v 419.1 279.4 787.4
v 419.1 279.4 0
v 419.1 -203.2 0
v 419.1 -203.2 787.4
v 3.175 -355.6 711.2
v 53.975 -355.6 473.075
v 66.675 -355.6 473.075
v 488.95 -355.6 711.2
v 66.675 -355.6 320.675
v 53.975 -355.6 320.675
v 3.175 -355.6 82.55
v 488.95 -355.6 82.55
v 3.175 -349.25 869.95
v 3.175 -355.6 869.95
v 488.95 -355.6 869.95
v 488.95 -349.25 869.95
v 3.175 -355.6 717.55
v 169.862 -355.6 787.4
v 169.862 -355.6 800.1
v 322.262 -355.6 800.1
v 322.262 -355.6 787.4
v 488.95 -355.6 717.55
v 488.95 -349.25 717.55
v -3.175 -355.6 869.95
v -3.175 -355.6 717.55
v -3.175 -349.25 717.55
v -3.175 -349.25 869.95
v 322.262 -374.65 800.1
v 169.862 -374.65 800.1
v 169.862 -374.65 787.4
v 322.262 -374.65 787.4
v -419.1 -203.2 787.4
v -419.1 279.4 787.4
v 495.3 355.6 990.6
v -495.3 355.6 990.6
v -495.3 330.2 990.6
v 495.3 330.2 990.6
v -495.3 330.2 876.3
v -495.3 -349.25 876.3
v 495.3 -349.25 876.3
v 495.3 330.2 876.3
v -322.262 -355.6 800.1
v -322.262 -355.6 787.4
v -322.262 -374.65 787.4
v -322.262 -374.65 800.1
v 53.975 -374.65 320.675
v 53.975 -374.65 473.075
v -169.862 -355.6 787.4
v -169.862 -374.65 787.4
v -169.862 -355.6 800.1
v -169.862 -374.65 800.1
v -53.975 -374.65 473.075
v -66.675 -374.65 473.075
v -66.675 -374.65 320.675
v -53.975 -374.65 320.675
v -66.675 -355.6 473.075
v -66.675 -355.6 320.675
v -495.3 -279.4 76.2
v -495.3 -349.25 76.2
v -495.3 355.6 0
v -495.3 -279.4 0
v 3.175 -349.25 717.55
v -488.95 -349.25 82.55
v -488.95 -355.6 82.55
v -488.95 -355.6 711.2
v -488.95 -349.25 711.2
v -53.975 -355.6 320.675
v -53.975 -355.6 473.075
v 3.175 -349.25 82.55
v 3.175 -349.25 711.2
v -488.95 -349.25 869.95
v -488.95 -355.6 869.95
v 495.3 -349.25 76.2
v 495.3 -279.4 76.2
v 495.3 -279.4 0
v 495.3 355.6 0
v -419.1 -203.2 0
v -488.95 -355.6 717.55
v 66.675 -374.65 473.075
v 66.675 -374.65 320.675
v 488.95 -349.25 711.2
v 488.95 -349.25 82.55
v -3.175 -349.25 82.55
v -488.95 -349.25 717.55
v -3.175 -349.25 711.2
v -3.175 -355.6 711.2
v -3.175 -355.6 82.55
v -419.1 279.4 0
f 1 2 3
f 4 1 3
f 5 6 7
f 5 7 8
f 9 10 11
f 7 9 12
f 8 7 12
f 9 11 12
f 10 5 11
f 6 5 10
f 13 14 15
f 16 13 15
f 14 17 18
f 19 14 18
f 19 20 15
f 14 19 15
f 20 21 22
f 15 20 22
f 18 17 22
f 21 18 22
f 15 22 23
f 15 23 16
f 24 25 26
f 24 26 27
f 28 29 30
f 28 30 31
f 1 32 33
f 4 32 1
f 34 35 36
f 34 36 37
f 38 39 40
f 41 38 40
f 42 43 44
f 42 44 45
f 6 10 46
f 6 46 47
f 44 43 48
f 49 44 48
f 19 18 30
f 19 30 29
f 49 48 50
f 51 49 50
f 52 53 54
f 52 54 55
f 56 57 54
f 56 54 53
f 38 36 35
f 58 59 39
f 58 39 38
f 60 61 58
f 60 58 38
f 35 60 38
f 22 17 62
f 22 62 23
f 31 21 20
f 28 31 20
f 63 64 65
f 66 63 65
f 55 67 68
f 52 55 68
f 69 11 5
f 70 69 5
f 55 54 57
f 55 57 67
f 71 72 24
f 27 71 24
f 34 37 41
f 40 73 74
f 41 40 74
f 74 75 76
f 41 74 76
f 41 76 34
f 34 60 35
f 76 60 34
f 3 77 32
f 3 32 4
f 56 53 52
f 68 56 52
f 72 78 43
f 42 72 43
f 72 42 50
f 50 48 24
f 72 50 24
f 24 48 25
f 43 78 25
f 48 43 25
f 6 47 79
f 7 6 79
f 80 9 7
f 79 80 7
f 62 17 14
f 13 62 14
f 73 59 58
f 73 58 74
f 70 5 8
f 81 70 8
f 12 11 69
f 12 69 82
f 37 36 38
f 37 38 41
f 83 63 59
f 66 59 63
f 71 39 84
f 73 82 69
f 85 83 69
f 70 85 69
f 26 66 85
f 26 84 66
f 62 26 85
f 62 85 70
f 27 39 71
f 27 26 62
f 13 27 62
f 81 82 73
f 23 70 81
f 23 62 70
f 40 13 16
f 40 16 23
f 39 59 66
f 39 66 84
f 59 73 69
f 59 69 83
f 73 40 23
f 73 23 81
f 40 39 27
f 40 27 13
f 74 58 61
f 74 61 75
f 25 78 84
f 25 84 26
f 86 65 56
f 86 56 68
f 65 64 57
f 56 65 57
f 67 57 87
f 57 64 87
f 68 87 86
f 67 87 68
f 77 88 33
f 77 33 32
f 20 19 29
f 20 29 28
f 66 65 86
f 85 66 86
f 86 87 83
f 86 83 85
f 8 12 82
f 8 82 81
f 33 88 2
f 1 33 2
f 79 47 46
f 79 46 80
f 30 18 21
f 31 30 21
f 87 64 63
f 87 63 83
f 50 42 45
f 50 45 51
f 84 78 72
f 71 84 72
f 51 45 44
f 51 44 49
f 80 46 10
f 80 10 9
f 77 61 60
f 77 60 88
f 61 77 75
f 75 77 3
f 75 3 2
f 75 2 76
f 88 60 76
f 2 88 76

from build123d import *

# Parameters (mm, degrees)
F0_W     = 990.6
F0_H     = 711.2
F1_DEPTH = 990.6
F2_W     = 990.6
F2_H     = 114.3
F3_DEPTH = 685.8
F2_H_2   = 800.1
F2_W_2   = 485.775
F2_H_3   = 628.65
F2_H_4   = 152.4
F4_DEPTH = 6.35
F2_H_5   = 76.2
F5_DEPTH = 76.2
F2_W_3   = 152.4
F2_H_6   = 12.7
F2_W_4   = 12.7
F6_DEPTH = 19.05
F7_W     = 838.2
F7_H     = 482.6
F8_DEPTH = 787.4


with BuildPart() as f1:
    # F0 (on Top) → F1 (new body)
    with BuildSketch(Plane.XY):
        Rectangle(F0_W, F0_H)
    extrude(amount=F1_DEPTH)

    # F2 (on face) → F3 (cut)
    with BuildSketch(Plane.XZ.offset(355.6)):
        with Locations((0, 933.45)):
            Rectangle(F2_W, F2_H)
    extrude(amount=-F3_DEPTH, mode=Mode.SUBTRACT)

    # F2 (on face) → F4 (cut)
    with BuildSketch(Plane.XZ.offset(355.6)):
        with Locations((0, 476.25)):
            Rectangle(F2_W, F2_H_2)
        with Locations((-246.0625, 396.875)):
            Rectangle(F2_W_2, F2_H_3, mode=Mode.SUBTRACT)
        with Locations((246.0625, 396.875)):
            Rectangle(F2_W_2, F2_H_3, mode=Mode.SUBTRACT)
        with Locations((-246.0625, 793.75)):
            Rectangle(F2_W_2, F2_H_4, mode=Mode.SUBTRACT)
        with Locations((246.0625, 793.75)):
            Rectangle(F2_W_2, F2_H_4, mode=Mode.SUBTRACT)
    extrude(amount=-F4_DEPTH, mode=Mode.SUBTRACT)

    # F2 (on face) → F5 (cut)
    with BuildSketch(Plane.XZ.offset(355.6)):
        with Locations((0, 38.1)):
            Rectangle(F2_W, F2_H_5)
    extrude(amount=-F5_DEPTH, mode=Mode.SUBTRACT)

    # F2 (on face) → F6 (join)
    with BuildSketch(Plane.XZ.offset(355.6)):
        with Locations((-246.0625, 793.75)):
            Rectangle(F2_W_3, F2_H_6)
        with Locations((246.0625, 793.75)):
            Rectangle(F2_W_3, F2_H_6)
        with Locations((60.325, 396.875)):
            Rectangle(F2_W_4, F2_H_4)
        with Locations((-60.325, 396.875)):
            Rectangle(F2_W_4, F2_H_4)
    extrude(amount=F6_DEPTH)

    # F7 (on face) → F8 (cut)
    with BuildSketch(Plane(origin=(0, 0, 0), x_dir=(1, 0, 0), z_dir=(0, 0, -1))):
        with Locations((0, -38.1)):
            Rectangle(F7_W, F7_H)
    extrude(amount=-F8_DEPTH, mode=Mode.SUBTRACT)


solid = f1.part
